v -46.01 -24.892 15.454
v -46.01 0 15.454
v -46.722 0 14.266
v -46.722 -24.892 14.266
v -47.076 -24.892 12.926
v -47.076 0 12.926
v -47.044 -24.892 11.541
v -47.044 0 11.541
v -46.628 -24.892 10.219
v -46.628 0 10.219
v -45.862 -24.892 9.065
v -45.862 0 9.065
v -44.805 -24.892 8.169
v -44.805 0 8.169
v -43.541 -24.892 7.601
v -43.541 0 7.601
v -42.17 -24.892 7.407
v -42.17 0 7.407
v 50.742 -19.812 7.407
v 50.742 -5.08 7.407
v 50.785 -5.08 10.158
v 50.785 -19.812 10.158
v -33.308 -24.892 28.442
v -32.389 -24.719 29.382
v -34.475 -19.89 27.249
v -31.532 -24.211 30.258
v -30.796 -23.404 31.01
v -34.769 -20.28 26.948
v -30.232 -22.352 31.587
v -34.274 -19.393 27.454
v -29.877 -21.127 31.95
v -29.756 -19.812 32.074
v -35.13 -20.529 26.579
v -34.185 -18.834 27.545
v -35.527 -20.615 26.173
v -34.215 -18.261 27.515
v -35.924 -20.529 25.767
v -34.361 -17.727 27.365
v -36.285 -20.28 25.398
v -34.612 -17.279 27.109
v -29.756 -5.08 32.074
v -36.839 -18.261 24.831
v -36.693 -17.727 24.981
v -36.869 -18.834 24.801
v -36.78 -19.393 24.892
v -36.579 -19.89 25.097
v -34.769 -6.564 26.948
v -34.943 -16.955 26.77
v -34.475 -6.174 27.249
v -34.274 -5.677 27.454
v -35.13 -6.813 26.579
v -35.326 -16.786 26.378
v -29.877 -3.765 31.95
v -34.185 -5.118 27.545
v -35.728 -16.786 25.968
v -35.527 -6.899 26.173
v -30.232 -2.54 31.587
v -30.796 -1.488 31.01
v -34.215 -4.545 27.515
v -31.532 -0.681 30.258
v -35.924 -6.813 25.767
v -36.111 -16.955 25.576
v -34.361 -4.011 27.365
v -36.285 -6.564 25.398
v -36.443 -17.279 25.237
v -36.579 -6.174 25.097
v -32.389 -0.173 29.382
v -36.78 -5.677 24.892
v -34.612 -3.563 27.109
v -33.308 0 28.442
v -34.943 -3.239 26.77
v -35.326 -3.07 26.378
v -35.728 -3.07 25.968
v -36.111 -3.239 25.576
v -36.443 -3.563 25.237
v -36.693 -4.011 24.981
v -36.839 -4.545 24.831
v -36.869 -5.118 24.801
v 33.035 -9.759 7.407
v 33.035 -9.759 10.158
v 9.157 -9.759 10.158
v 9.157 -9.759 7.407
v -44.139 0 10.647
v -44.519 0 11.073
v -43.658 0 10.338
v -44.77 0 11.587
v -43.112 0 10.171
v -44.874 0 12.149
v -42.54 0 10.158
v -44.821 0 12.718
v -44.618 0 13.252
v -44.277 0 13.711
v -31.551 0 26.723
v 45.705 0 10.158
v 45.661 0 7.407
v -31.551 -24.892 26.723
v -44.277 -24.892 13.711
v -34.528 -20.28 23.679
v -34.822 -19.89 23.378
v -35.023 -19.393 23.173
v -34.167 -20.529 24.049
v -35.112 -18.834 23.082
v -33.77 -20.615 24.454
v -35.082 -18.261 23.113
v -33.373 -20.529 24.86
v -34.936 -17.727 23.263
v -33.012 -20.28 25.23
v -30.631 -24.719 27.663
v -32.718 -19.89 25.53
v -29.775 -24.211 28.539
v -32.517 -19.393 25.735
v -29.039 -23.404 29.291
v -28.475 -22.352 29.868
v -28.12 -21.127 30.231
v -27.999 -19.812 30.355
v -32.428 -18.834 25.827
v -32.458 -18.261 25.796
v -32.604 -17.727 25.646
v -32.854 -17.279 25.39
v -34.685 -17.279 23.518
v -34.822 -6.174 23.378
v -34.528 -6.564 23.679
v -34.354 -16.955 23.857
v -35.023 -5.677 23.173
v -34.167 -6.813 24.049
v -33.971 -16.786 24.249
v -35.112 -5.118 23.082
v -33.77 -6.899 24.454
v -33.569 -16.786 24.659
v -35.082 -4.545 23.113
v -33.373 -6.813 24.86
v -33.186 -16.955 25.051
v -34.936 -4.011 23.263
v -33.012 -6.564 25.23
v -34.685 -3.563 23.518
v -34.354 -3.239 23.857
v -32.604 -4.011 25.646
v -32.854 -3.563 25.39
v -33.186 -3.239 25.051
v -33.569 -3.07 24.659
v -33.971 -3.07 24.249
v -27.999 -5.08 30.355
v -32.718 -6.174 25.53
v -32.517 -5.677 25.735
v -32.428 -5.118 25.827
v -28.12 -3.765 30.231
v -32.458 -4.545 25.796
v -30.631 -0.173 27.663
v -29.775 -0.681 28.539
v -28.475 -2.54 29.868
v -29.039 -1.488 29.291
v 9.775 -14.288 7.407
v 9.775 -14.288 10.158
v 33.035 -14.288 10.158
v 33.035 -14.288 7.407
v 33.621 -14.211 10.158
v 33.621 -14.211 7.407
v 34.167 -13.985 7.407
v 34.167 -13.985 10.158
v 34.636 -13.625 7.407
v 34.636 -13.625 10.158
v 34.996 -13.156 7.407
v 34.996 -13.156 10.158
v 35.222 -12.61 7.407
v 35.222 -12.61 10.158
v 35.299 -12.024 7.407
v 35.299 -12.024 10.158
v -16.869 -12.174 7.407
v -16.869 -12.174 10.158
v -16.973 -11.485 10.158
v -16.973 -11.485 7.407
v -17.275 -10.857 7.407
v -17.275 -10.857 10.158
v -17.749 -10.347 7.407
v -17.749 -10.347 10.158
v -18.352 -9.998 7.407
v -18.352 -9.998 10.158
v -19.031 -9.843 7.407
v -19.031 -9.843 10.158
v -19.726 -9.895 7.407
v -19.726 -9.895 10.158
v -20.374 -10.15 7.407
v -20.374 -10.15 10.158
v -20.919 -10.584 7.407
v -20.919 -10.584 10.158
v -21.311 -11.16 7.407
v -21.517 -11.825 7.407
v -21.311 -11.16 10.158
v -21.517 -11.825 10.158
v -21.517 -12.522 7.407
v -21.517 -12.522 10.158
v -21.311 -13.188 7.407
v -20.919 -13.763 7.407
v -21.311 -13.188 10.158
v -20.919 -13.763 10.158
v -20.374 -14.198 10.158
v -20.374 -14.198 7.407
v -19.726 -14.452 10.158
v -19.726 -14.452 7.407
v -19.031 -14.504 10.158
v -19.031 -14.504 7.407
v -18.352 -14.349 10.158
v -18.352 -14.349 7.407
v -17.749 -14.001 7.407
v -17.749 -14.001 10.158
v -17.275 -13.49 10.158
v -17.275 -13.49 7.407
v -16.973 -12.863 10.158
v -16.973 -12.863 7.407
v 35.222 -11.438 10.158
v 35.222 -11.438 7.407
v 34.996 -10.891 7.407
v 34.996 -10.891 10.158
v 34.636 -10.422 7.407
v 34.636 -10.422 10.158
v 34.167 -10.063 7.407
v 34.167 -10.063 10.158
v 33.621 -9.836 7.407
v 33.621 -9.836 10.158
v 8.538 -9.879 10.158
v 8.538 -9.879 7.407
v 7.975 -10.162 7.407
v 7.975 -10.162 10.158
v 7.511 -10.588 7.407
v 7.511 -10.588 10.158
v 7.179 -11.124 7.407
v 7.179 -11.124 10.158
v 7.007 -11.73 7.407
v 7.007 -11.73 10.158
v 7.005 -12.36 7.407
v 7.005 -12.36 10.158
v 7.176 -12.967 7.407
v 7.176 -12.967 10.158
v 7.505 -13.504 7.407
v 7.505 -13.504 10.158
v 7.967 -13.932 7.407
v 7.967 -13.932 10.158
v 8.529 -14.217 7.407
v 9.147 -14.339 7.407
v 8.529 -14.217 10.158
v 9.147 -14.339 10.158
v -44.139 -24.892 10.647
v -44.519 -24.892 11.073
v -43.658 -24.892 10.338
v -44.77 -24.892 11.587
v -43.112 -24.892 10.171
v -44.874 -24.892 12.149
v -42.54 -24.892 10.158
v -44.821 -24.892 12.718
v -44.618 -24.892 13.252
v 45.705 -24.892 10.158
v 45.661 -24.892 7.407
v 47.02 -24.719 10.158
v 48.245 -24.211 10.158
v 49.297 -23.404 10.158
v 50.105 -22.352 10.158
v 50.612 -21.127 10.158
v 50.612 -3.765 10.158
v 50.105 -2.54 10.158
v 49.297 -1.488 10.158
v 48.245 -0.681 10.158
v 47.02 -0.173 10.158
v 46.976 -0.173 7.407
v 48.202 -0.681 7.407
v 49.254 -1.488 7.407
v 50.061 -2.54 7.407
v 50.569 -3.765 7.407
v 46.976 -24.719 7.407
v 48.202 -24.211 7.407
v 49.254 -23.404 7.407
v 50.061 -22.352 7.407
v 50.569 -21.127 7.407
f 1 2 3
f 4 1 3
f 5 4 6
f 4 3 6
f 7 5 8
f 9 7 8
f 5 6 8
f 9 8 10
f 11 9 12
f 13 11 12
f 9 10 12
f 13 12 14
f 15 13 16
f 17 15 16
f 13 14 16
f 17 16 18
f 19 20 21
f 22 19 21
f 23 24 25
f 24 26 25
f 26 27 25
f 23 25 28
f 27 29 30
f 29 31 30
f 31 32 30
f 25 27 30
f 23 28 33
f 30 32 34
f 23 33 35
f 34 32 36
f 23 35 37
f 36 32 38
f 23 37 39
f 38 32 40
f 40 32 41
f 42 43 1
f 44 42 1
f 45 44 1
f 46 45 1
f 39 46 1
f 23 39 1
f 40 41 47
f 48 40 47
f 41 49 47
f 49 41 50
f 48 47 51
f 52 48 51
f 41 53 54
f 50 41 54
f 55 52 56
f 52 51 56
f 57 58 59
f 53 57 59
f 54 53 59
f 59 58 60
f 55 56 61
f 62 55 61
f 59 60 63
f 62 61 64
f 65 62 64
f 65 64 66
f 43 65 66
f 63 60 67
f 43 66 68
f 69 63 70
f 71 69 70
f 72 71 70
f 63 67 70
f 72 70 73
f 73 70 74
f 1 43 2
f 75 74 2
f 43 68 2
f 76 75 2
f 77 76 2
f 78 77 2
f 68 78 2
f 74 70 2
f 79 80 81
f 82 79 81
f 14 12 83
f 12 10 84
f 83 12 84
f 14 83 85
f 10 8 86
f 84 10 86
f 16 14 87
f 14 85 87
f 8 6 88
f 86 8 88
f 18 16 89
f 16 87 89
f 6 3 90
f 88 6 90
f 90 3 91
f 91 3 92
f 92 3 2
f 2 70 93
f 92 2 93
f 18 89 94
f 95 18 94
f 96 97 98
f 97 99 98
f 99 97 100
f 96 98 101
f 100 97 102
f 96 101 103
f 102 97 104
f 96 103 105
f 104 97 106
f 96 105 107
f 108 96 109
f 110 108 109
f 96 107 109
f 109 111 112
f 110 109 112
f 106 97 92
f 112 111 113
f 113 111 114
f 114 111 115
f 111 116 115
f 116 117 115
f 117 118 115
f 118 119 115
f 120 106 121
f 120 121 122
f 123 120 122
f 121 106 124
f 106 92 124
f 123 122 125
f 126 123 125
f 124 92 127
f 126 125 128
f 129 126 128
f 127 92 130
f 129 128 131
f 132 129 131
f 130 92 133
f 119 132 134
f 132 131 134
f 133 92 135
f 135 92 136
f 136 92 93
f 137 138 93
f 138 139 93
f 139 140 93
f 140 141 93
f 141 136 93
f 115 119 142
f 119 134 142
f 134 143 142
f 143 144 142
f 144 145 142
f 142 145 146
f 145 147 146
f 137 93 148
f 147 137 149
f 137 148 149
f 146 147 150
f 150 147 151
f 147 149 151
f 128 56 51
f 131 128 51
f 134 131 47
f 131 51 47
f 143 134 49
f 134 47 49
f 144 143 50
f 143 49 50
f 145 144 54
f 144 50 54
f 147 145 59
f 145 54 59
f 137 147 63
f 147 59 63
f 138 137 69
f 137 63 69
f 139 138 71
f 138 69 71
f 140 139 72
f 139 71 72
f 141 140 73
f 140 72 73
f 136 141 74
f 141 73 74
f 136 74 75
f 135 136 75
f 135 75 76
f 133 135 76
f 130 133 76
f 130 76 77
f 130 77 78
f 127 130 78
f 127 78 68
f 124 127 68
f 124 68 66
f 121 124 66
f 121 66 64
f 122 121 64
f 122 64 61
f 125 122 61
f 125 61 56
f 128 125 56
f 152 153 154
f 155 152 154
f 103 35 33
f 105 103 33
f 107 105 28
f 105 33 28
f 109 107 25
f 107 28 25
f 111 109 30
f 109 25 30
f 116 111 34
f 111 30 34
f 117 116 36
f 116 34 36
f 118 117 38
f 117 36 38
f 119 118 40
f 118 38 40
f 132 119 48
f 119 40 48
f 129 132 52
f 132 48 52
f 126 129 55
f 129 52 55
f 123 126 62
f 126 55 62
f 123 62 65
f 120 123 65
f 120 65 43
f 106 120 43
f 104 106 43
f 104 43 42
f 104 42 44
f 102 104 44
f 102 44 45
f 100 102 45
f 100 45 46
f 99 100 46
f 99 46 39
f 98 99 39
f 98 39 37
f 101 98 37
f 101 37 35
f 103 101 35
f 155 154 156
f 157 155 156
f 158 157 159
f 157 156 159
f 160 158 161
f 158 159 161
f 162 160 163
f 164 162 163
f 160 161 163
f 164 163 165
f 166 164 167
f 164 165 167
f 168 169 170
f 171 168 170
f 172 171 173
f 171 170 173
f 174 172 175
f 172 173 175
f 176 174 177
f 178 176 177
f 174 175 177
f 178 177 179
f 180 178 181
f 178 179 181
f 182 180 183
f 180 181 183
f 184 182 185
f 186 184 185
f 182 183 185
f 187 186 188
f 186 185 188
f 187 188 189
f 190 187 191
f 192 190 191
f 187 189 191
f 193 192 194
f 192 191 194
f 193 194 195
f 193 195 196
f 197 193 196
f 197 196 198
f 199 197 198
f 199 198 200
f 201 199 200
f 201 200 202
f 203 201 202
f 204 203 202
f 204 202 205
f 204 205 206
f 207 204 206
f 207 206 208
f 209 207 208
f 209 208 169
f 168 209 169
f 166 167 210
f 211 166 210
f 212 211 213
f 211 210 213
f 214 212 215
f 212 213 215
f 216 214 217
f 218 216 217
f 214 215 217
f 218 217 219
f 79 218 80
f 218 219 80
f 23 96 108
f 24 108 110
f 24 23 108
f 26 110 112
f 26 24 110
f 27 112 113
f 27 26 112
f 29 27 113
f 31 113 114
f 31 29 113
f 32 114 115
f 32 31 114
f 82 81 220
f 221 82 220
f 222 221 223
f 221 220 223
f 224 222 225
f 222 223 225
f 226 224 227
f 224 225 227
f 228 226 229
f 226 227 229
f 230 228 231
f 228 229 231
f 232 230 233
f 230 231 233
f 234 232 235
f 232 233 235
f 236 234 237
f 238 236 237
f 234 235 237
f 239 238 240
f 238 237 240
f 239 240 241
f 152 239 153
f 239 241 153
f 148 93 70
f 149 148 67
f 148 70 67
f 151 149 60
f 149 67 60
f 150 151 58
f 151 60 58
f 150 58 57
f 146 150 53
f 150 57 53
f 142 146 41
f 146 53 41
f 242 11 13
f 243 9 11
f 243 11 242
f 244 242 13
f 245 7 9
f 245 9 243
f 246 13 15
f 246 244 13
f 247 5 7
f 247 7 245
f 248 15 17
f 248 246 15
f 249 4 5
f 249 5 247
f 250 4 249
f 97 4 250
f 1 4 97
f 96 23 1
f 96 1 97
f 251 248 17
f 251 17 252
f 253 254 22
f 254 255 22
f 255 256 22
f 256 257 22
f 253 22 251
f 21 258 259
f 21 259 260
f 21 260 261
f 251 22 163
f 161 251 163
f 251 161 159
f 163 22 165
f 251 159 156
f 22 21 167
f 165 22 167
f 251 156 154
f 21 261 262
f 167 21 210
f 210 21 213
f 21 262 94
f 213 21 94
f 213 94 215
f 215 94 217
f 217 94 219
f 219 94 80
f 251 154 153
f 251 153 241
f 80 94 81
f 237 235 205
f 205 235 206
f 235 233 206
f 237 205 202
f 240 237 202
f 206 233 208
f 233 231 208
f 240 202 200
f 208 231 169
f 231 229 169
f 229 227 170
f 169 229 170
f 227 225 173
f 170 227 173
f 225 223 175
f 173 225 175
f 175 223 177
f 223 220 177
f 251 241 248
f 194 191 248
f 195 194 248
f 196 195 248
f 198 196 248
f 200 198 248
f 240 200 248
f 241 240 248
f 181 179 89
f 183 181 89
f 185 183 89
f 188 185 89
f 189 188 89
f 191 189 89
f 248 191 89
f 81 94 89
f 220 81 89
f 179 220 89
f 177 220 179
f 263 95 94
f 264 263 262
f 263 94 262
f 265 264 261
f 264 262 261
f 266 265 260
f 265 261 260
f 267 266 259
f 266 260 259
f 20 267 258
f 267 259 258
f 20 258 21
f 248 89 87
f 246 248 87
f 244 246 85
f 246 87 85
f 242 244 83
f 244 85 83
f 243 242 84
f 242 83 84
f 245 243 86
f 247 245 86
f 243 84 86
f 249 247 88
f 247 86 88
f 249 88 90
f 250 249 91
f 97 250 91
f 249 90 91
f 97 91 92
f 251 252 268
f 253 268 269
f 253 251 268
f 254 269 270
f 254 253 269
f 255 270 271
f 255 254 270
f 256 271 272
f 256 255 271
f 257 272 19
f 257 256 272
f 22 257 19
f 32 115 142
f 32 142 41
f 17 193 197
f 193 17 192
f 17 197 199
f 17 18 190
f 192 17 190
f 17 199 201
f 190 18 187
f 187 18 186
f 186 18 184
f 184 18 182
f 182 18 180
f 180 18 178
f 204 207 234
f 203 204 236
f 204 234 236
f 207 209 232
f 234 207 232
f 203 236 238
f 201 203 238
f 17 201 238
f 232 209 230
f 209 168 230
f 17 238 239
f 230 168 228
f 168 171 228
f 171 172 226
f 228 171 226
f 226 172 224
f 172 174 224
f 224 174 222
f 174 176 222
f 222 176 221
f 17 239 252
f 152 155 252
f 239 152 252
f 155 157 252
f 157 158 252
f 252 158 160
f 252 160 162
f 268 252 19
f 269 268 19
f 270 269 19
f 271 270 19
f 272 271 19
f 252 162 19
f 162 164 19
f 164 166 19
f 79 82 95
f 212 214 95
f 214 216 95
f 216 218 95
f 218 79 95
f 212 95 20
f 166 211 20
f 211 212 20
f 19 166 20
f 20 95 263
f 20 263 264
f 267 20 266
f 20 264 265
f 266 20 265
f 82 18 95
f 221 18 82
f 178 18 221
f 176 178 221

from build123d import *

# Parameters (mm, degrees)
F1_DEPTH = 24.892
F3_R     = 1.9249928247
F4_DEPTH = 25.4
F8_DEPTH = 25.4
F6_R     = 2.33692874
F9_DEPTH = 25.4
F10_R    = 5.08


with BuildPart() as f1:
    # F0 (on Front) → F1 (new body)
    with BuildSketch(Plane.XZ):
        with BuildLine():
            Line((-42.1696156263, 7.4068200774), (50.741981715, 7.4068200774))
            Line((50.741981715, 7.4068200774), (50.7852658629, 10.1576624438))
            Line((50.7852658629, 10.1576624438), (-42.5401590765, 10.1576624438))
            ThreePointArc((-42.5401590765, 10.1576624438), (-44.6625185823, 11.3214684612), (-44.2773737299, 13.7111374259))
            Line((-44.2773737299, 13.7111374259), (-27.9987339674, 30.3550571651))
            Line((-27.9987339674, 30.3550571651), (-29.7558531165, 32.0736132562))
            Line((-29.7558531165, 32.0736132562), (-46.0104458034, 15.4542801902))
            ThreePointArc((-46.0104458034, 15.4542801902), (-46.6281352998, 10.2191830011), (-42.1696156263, 7.4068200774))
        make_face()
    extrude(amount=F1_DEPTH)

    # F3 (on offset) → F4 (cut)
    with BuildSketch(Plane(origin=(-35.0542101214, 0, 34.2848840697), x_dir=(0, -1, 0), z_dir=(-0.7149082188, 0, 0.6992183055))):
        with Locations((4.9738232046, -6.1299321242)):
            Circle(F3_R)
        with Locations((18.6898232046, -6.1299321242)):
            Circle(F3_R)
    extrude(amount=-F4_DEPTH, mode=Mode.SUBTRACT)

    # F7 (on offset) → F8 (cut)
    with BuildSketch(Plane.XY.offset(17.78)):
        with BuildLine():
            ThreePointArc((9.39899395, -9.7591195918), (10.9418290691, -10.4711006155), (11.5712740591, -12.0494086295))
            ThreePointArc((11.5712740591, -12.0494086295), (11.0668007338, -13.4845114856), (9.7753070295, -14.2882885411))
            Line((9.7753070295, -14.2882885411), (33.0347828567, -14.2882885411))
            ThreePointArc((33.0347828567, -14.2882885411), (30.770198382, -12.0237040665), (33.0347828567, -9.7591195918))
            Line((33.0347828567, -9.7591195918), (9.39899395, -9.7591195918))
        make_face()
        with BuildLine():
            Line((33.0347828567, -14.2882885411), (33.0347828567, -9.7591195918))
            ThreePointArc((33.0347828567, -9.7591195918), (30.770198382, -12.0237040665), (33.0347828567, -14.2882885411))
        make_face()
        with BuildLine():
            ThreePointArc((35.2993673314, -12.0237040665), (34.6360858953, -10.4224010279), (33.0347828567, -9.7591195918))
            Line((33.0347828567, -9.7591195918), (33.0347828567, -14.2882885411))
            ThreePointArc((33.0347828567, -14.2882885411), (34.6360858953, -13.6250071051), (35.2993673314, -12.0237040665))
        make_face()
        with BuildLine():
            ThreePointArc((9.1565652679, -9.7591195918), (7.0053919382, -12.3598455256), (9.7753070295, -14.2882885411))
            Line((9.7753070295, -14.2882885411), (9.1565652679, -14.2882885411))
            Line((9.1565652679, -14.2882885411), (9.1565652679, -9.7591195918))
        make_face()
        with BuildLine():
            ThreePointArc((9.7753070295, -14.2882885411), (11.0668007338, -13.4845114856), (11.5712740591, -12.0494086295))
            ThreePointArc((11.5712740591, -12.0494086295), (10.9418290691, -10.4711006155), (9.39899395, -9.7591195918))
            Line((9.39899395, -9.7591195918), (9.1565652679, -9.7591195918))
            Line((9.1565652679, -9.7591195918), (9.1565652679, -14.2882885411))
            Line((9.1565652679, -14.2882885411), (9.7753070295, -14.2882885411))
        make_face()
    extrude(amount=-F8_DEPTH, mode=Mode.SUBTRACT)

    # F6 (on offset) → F9 (cut)
    with BuildSketch(Plane.XY.offset(17.78)):
        with Locations((-19.2057471722, -12.1737904847)):
            Circle(F6_R)
    extrude(amount=-F9_DEPTH, mode=Mode.SUBTRACT)

    # F10
    f10_edges = [f1.edges().sort_by_distance(p)[0] for p in [
        (-28.877294, 0, 31.214335),
        (-28.877294, -24.892, 31.214335),
        (50.763624, -24.892, 8.782241),
        (50.763624, 0, 8.782241),
    ]]
    fillet(f10_edges, radius=F10_R)


solid = f1.part
